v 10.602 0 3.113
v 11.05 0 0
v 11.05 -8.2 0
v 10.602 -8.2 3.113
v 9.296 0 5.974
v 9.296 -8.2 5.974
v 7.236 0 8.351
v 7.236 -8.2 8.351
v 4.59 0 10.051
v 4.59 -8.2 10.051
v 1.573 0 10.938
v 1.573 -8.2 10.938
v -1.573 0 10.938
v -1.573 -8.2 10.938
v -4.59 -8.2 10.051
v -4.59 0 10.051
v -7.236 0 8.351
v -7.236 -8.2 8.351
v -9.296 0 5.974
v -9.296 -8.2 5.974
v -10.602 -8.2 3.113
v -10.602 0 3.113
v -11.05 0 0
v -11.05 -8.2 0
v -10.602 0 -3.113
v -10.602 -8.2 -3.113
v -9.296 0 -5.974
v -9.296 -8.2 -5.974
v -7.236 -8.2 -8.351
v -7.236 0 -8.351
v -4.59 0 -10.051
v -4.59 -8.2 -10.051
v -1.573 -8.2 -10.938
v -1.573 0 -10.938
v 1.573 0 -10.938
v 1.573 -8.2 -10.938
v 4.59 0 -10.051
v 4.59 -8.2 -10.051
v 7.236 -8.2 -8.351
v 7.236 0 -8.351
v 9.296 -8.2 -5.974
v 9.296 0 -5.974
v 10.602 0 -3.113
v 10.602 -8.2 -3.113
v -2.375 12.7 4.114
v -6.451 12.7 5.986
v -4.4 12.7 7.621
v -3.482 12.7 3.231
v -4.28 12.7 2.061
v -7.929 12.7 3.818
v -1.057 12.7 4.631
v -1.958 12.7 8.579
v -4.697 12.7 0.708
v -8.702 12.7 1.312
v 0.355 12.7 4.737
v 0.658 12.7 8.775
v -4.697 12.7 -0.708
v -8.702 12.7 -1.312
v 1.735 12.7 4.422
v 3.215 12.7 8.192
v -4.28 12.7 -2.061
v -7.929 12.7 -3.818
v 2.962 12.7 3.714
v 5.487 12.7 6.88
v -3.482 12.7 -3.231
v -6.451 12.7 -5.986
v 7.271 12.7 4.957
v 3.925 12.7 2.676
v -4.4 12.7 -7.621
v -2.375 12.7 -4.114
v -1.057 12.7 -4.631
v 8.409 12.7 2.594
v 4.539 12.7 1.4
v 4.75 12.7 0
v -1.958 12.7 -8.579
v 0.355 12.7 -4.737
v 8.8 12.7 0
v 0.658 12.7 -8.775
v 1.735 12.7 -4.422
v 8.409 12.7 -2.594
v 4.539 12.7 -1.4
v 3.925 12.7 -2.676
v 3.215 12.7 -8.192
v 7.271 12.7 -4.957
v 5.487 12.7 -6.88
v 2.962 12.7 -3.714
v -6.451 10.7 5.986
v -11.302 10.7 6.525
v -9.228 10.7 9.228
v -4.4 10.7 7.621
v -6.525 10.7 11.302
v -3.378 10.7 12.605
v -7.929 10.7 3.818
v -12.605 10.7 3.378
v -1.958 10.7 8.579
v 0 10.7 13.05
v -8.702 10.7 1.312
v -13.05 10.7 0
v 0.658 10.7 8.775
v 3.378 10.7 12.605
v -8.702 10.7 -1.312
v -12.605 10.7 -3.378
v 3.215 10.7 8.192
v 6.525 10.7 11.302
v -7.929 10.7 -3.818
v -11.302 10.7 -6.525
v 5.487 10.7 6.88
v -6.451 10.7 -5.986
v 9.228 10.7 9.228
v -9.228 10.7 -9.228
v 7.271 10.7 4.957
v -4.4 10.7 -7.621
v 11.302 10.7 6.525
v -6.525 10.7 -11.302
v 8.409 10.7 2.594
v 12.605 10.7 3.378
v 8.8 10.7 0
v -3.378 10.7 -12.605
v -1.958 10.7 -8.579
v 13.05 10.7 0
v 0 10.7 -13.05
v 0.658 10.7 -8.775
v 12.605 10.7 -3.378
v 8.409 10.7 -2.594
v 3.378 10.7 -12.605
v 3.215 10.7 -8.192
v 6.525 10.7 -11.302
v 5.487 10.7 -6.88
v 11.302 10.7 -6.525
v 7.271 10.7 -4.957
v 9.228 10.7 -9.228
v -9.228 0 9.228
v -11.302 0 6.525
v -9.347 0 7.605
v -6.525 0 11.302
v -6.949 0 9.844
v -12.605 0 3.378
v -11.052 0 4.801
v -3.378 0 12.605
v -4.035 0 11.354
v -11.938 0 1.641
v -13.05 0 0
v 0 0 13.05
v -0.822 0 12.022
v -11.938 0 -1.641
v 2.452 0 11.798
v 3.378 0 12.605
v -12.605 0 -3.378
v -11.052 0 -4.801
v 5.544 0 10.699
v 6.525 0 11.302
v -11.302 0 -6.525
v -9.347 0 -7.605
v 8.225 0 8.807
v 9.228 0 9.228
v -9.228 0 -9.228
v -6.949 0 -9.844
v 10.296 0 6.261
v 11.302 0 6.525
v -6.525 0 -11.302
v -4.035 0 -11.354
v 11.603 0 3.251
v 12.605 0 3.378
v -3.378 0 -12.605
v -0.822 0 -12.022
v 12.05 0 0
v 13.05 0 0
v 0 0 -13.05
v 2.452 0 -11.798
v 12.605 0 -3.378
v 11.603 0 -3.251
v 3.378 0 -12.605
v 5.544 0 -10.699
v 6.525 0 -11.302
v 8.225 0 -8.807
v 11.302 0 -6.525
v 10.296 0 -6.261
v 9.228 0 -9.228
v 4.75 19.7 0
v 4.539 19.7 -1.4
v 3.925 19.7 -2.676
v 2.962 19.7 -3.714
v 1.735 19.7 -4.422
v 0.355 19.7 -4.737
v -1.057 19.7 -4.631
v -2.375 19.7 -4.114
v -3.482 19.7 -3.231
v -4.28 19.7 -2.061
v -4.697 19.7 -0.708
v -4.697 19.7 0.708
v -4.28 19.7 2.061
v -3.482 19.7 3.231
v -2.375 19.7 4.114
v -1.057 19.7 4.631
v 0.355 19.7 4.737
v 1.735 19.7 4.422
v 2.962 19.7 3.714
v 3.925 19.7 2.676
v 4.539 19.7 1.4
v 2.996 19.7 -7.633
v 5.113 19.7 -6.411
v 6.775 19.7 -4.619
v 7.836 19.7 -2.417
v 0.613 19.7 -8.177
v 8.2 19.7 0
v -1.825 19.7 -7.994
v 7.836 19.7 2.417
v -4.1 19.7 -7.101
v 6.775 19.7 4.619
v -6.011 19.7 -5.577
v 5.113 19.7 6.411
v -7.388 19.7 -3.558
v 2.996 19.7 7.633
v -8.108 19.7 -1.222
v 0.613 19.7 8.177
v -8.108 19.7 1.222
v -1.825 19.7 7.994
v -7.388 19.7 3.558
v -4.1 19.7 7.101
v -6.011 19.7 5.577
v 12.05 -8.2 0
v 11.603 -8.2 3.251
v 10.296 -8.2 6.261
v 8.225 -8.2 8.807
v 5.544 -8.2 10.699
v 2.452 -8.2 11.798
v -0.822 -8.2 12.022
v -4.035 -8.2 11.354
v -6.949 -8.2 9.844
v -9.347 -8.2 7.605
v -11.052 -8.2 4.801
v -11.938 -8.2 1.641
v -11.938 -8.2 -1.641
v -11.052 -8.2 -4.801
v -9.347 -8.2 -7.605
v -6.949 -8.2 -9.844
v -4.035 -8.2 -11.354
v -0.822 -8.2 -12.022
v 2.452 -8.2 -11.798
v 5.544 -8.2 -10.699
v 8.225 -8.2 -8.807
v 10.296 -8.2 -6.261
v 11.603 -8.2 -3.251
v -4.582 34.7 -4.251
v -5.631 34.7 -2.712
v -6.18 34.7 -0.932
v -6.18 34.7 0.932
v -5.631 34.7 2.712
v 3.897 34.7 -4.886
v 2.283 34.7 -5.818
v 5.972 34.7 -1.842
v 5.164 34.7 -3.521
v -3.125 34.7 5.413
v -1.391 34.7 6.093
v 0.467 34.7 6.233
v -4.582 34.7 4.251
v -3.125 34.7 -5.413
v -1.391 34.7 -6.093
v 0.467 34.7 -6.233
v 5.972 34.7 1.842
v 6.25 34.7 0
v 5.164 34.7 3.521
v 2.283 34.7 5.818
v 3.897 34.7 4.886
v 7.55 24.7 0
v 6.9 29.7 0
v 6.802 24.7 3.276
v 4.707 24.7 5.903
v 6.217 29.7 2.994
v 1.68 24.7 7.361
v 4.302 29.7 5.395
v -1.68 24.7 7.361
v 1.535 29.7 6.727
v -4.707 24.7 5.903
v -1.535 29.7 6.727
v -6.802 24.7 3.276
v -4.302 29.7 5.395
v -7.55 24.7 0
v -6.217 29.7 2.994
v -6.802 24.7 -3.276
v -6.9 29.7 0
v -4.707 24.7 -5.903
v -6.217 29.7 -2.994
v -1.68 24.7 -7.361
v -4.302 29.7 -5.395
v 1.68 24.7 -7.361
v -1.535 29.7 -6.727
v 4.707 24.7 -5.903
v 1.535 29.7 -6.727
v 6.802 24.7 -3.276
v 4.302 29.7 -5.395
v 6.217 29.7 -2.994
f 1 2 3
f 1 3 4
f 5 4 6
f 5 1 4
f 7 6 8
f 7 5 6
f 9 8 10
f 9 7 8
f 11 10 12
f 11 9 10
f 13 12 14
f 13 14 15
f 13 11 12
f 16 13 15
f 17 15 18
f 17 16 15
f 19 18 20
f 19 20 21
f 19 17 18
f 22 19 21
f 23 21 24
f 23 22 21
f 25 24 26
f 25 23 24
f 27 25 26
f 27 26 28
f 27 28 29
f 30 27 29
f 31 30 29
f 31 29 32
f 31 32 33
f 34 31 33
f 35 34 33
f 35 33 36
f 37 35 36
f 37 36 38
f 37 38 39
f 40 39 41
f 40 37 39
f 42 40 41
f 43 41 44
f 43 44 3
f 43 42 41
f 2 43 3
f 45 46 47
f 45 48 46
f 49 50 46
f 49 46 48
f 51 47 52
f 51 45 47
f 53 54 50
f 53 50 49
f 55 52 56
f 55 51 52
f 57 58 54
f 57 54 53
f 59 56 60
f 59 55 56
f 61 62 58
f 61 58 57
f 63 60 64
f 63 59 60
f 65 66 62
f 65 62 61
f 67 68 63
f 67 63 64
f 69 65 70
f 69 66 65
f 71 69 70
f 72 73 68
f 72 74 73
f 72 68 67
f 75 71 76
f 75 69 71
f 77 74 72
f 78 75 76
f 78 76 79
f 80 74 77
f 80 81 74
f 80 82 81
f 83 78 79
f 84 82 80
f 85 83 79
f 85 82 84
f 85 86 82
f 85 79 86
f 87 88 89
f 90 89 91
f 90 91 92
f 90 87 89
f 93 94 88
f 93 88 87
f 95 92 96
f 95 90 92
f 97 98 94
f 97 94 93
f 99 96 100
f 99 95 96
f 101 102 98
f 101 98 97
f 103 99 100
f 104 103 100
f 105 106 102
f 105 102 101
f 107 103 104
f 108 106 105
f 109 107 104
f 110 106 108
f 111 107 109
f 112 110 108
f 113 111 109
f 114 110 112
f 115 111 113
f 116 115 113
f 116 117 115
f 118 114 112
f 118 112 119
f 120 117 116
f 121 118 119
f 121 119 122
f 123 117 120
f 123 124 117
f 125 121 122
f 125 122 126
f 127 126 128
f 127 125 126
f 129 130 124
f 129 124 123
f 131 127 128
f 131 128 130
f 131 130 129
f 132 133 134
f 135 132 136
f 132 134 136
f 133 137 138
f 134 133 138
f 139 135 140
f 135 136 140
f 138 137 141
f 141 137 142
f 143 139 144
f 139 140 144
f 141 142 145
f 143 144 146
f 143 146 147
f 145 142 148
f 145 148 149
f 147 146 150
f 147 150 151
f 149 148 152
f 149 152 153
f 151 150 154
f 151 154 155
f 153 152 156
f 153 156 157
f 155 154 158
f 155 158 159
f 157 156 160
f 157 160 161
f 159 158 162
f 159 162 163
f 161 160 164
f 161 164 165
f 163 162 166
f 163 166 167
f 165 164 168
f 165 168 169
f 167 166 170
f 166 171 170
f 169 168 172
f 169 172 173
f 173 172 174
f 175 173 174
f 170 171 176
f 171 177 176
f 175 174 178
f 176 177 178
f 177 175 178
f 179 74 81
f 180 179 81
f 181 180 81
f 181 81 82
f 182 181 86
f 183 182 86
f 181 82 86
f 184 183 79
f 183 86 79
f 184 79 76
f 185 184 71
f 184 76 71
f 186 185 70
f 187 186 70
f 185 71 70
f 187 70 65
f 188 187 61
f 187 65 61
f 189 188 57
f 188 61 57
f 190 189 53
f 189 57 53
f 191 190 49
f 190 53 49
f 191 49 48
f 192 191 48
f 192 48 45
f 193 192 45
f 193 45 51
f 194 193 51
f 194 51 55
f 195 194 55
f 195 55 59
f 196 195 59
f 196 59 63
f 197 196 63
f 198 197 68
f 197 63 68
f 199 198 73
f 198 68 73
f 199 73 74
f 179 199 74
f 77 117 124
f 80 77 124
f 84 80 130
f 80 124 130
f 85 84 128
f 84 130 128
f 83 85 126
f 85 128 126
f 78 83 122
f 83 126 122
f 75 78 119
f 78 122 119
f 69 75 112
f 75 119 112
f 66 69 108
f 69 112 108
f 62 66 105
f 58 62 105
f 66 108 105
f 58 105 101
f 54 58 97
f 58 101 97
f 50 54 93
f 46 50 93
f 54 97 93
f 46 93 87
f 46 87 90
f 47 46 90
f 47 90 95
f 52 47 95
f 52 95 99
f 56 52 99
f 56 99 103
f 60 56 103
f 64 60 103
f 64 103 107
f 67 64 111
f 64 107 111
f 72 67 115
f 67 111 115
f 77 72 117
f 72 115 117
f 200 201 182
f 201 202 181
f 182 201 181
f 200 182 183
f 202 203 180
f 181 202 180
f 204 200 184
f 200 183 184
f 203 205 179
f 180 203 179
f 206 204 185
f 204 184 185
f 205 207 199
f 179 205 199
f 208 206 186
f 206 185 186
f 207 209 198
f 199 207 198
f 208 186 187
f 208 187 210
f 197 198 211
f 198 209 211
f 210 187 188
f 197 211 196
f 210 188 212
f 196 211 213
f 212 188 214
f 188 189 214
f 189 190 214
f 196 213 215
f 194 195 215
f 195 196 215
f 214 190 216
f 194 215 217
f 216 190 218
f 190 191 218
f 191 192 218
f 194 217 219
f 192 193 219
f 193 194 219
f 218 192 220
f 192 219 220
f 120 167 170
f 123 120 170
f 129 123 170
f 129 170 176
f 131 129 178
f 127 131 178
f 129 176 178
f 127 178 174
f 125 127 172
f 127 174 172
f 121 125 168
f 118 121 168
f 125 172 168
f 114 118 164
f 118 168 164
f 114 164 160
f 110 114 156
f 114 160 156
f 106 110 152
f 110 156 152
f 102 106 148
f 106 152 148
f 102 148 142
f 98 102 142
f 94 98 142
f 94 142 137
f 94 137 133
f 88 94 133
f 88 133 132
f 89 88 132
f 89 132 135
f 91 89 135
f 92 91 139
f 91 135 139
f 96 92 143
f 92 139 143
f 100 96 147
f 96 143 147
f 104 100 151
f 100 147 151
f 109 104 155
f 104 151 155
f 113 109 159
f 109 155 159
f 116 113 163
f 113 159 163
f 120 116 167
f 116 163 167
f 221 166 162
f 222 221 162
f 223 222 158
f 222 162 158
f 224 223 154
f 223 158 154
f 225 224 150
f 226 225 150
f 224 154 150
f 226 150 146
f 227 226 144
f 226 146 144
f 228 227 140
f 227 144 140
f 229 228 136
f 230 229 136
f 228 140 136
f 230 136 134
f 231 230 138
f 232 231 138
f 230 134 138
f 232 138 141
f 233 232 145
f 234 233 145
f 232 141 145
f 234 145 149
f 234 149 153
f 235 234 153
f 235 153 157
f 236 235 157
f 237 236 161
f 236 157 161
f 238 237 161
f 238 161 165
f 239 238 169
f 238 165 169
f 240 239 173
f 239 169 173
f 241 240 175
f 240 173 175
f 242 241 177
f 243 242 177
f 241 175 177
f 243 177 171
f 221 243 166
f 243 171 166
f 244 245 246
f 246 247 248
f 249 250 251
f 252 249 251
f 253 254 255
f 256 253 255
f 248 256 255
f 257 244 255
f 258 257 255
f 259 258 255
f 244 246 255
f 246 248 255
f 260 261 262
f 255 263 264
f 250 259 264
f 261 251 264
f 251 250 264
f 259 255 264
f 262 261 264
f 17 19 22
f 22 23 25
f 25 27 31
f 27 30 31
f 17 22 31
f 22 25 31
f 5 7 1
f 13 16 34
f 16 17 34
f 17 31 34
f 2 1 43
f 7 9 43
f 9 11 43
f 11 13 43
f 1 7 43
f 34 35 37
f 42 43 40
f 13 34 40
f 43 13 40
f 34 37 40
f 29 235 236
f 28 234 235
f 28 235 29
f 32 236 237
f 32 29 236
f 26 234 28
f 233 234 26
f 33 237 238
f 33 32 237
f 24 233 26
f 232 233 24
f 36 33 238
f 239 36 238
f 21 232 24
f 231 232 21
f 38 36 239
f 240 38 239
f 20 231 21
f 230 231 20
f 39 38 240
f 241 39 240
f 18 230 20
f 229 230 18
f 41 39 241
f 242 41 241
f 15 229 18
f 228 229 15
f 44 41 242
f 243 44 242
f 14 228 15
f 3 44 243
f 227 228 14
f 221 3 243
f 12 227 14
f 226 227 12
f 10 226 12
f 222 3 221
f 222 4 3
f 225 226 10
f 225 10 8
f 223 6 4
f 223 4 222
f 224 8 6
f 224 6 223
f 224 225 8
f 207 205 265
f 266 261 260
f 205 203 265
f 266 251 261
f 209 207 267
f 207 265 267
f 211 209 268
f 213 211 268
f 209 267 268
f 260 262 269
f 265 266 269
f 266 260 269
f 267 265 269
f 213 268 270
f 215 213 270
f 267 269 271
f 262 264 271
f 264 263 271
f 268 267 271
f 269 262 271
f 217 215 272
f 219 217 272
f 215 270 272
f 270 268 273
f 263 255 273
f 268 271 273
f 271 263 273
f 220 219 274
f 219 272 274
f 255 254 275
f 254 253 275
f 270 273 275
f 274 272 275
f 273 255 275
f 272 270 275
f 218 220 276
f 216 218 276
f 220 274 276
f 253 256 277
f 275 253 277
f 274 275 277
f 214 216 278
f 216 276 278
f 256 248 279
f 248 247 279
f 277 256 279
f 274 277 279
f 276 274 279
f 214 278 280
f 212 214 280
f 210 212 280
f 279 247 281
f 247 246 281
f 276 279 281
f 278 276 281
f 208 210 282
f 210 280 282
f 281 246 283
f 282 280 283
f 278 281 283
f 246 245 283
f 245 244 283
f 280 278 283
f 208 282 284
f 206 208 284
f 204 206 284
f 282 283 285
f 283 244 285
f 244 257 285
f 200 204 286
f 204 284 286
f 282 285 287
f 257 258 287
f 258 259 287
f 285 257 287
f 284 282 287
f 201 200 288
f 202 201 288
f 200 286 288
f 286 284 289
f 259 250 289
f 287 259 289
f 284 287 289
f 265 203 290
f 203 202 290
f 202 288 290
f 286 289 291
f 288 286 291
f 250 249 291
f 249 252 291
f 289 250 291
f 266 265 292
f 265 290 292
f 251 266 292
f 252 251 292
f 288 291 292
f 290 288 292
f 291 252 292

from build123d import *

# Parameters (mm, degrees)
ESQUISSE1_R        = 13.05
BOSS_EXTRU_1_DEPTH = 10.7
ESQUISSE2_R        = 8.8
BOSS_EXTRU_2_DEPTH = 2
ESQUISSE3_R        = 4.75
BOSS_EXTRU_3_DEPTH = 7
ESQUISSE5_R        = 12.05
ESQUISSE5_R_2      = 11.05
BOSS_EXTRU_5_DEPTH = 8.2


with BuildPart() as part:
    # Esquisse1 → Boss.-Extru.1 (new body)
    with BuildSketch(Plane(origin=(0, 0, 0), x_dir=(1, 0, 0), z_dir=(0, 1, 0))):
        Circle(ESQUISSE1_R)
    extrude(amount=BOSS_EXTRU_1_DEPTH)

    # Esquisse2 → Boss.-Extru.2 (add)
    with BuildSketch(Plane(origin=(0, 10.7, 0), x_dir=(1, 0, 0), z_dir=(0, 1, 0))):
        Circle(ESQUISSE2_R)
    extrude(amount=BOSS_EXTRU_2_DEPTH)

    # Esquisse3 → Boss.-Extru.3 (add)
    with BuildSketch(Plane(origin=(0, 12.7, 0), x_dir=(1, 0, 0), z_dir=(0, 1, 0))):
        Circle(ESQUISSE3_R)
    extrude(amount=BOSS_EXTRU_3_DEPTH)

    # Esquisse5 → Boss.-Extru.5 (add)
    with BuildSketch(Plane.XZ):
        Circle(ESQUISSE5_R)
        Circle(ESQUISSE5_R_2, mode=Mode.SUBTRACT)
    extrude(amount=BOSS_EXTRU_5_DEPTH)

    # Esquisse6 → Révolution1 (revolve)
    with BuildSketch(Plane.XY):
        Polygon((0, 19.7), (8.2, 19.7), (6.25, 34.7), (0, 34.7), align=None)
    revolve(axis=Axis((0, 34.7, 0), (0, -1, 0)))


solid = part.part
